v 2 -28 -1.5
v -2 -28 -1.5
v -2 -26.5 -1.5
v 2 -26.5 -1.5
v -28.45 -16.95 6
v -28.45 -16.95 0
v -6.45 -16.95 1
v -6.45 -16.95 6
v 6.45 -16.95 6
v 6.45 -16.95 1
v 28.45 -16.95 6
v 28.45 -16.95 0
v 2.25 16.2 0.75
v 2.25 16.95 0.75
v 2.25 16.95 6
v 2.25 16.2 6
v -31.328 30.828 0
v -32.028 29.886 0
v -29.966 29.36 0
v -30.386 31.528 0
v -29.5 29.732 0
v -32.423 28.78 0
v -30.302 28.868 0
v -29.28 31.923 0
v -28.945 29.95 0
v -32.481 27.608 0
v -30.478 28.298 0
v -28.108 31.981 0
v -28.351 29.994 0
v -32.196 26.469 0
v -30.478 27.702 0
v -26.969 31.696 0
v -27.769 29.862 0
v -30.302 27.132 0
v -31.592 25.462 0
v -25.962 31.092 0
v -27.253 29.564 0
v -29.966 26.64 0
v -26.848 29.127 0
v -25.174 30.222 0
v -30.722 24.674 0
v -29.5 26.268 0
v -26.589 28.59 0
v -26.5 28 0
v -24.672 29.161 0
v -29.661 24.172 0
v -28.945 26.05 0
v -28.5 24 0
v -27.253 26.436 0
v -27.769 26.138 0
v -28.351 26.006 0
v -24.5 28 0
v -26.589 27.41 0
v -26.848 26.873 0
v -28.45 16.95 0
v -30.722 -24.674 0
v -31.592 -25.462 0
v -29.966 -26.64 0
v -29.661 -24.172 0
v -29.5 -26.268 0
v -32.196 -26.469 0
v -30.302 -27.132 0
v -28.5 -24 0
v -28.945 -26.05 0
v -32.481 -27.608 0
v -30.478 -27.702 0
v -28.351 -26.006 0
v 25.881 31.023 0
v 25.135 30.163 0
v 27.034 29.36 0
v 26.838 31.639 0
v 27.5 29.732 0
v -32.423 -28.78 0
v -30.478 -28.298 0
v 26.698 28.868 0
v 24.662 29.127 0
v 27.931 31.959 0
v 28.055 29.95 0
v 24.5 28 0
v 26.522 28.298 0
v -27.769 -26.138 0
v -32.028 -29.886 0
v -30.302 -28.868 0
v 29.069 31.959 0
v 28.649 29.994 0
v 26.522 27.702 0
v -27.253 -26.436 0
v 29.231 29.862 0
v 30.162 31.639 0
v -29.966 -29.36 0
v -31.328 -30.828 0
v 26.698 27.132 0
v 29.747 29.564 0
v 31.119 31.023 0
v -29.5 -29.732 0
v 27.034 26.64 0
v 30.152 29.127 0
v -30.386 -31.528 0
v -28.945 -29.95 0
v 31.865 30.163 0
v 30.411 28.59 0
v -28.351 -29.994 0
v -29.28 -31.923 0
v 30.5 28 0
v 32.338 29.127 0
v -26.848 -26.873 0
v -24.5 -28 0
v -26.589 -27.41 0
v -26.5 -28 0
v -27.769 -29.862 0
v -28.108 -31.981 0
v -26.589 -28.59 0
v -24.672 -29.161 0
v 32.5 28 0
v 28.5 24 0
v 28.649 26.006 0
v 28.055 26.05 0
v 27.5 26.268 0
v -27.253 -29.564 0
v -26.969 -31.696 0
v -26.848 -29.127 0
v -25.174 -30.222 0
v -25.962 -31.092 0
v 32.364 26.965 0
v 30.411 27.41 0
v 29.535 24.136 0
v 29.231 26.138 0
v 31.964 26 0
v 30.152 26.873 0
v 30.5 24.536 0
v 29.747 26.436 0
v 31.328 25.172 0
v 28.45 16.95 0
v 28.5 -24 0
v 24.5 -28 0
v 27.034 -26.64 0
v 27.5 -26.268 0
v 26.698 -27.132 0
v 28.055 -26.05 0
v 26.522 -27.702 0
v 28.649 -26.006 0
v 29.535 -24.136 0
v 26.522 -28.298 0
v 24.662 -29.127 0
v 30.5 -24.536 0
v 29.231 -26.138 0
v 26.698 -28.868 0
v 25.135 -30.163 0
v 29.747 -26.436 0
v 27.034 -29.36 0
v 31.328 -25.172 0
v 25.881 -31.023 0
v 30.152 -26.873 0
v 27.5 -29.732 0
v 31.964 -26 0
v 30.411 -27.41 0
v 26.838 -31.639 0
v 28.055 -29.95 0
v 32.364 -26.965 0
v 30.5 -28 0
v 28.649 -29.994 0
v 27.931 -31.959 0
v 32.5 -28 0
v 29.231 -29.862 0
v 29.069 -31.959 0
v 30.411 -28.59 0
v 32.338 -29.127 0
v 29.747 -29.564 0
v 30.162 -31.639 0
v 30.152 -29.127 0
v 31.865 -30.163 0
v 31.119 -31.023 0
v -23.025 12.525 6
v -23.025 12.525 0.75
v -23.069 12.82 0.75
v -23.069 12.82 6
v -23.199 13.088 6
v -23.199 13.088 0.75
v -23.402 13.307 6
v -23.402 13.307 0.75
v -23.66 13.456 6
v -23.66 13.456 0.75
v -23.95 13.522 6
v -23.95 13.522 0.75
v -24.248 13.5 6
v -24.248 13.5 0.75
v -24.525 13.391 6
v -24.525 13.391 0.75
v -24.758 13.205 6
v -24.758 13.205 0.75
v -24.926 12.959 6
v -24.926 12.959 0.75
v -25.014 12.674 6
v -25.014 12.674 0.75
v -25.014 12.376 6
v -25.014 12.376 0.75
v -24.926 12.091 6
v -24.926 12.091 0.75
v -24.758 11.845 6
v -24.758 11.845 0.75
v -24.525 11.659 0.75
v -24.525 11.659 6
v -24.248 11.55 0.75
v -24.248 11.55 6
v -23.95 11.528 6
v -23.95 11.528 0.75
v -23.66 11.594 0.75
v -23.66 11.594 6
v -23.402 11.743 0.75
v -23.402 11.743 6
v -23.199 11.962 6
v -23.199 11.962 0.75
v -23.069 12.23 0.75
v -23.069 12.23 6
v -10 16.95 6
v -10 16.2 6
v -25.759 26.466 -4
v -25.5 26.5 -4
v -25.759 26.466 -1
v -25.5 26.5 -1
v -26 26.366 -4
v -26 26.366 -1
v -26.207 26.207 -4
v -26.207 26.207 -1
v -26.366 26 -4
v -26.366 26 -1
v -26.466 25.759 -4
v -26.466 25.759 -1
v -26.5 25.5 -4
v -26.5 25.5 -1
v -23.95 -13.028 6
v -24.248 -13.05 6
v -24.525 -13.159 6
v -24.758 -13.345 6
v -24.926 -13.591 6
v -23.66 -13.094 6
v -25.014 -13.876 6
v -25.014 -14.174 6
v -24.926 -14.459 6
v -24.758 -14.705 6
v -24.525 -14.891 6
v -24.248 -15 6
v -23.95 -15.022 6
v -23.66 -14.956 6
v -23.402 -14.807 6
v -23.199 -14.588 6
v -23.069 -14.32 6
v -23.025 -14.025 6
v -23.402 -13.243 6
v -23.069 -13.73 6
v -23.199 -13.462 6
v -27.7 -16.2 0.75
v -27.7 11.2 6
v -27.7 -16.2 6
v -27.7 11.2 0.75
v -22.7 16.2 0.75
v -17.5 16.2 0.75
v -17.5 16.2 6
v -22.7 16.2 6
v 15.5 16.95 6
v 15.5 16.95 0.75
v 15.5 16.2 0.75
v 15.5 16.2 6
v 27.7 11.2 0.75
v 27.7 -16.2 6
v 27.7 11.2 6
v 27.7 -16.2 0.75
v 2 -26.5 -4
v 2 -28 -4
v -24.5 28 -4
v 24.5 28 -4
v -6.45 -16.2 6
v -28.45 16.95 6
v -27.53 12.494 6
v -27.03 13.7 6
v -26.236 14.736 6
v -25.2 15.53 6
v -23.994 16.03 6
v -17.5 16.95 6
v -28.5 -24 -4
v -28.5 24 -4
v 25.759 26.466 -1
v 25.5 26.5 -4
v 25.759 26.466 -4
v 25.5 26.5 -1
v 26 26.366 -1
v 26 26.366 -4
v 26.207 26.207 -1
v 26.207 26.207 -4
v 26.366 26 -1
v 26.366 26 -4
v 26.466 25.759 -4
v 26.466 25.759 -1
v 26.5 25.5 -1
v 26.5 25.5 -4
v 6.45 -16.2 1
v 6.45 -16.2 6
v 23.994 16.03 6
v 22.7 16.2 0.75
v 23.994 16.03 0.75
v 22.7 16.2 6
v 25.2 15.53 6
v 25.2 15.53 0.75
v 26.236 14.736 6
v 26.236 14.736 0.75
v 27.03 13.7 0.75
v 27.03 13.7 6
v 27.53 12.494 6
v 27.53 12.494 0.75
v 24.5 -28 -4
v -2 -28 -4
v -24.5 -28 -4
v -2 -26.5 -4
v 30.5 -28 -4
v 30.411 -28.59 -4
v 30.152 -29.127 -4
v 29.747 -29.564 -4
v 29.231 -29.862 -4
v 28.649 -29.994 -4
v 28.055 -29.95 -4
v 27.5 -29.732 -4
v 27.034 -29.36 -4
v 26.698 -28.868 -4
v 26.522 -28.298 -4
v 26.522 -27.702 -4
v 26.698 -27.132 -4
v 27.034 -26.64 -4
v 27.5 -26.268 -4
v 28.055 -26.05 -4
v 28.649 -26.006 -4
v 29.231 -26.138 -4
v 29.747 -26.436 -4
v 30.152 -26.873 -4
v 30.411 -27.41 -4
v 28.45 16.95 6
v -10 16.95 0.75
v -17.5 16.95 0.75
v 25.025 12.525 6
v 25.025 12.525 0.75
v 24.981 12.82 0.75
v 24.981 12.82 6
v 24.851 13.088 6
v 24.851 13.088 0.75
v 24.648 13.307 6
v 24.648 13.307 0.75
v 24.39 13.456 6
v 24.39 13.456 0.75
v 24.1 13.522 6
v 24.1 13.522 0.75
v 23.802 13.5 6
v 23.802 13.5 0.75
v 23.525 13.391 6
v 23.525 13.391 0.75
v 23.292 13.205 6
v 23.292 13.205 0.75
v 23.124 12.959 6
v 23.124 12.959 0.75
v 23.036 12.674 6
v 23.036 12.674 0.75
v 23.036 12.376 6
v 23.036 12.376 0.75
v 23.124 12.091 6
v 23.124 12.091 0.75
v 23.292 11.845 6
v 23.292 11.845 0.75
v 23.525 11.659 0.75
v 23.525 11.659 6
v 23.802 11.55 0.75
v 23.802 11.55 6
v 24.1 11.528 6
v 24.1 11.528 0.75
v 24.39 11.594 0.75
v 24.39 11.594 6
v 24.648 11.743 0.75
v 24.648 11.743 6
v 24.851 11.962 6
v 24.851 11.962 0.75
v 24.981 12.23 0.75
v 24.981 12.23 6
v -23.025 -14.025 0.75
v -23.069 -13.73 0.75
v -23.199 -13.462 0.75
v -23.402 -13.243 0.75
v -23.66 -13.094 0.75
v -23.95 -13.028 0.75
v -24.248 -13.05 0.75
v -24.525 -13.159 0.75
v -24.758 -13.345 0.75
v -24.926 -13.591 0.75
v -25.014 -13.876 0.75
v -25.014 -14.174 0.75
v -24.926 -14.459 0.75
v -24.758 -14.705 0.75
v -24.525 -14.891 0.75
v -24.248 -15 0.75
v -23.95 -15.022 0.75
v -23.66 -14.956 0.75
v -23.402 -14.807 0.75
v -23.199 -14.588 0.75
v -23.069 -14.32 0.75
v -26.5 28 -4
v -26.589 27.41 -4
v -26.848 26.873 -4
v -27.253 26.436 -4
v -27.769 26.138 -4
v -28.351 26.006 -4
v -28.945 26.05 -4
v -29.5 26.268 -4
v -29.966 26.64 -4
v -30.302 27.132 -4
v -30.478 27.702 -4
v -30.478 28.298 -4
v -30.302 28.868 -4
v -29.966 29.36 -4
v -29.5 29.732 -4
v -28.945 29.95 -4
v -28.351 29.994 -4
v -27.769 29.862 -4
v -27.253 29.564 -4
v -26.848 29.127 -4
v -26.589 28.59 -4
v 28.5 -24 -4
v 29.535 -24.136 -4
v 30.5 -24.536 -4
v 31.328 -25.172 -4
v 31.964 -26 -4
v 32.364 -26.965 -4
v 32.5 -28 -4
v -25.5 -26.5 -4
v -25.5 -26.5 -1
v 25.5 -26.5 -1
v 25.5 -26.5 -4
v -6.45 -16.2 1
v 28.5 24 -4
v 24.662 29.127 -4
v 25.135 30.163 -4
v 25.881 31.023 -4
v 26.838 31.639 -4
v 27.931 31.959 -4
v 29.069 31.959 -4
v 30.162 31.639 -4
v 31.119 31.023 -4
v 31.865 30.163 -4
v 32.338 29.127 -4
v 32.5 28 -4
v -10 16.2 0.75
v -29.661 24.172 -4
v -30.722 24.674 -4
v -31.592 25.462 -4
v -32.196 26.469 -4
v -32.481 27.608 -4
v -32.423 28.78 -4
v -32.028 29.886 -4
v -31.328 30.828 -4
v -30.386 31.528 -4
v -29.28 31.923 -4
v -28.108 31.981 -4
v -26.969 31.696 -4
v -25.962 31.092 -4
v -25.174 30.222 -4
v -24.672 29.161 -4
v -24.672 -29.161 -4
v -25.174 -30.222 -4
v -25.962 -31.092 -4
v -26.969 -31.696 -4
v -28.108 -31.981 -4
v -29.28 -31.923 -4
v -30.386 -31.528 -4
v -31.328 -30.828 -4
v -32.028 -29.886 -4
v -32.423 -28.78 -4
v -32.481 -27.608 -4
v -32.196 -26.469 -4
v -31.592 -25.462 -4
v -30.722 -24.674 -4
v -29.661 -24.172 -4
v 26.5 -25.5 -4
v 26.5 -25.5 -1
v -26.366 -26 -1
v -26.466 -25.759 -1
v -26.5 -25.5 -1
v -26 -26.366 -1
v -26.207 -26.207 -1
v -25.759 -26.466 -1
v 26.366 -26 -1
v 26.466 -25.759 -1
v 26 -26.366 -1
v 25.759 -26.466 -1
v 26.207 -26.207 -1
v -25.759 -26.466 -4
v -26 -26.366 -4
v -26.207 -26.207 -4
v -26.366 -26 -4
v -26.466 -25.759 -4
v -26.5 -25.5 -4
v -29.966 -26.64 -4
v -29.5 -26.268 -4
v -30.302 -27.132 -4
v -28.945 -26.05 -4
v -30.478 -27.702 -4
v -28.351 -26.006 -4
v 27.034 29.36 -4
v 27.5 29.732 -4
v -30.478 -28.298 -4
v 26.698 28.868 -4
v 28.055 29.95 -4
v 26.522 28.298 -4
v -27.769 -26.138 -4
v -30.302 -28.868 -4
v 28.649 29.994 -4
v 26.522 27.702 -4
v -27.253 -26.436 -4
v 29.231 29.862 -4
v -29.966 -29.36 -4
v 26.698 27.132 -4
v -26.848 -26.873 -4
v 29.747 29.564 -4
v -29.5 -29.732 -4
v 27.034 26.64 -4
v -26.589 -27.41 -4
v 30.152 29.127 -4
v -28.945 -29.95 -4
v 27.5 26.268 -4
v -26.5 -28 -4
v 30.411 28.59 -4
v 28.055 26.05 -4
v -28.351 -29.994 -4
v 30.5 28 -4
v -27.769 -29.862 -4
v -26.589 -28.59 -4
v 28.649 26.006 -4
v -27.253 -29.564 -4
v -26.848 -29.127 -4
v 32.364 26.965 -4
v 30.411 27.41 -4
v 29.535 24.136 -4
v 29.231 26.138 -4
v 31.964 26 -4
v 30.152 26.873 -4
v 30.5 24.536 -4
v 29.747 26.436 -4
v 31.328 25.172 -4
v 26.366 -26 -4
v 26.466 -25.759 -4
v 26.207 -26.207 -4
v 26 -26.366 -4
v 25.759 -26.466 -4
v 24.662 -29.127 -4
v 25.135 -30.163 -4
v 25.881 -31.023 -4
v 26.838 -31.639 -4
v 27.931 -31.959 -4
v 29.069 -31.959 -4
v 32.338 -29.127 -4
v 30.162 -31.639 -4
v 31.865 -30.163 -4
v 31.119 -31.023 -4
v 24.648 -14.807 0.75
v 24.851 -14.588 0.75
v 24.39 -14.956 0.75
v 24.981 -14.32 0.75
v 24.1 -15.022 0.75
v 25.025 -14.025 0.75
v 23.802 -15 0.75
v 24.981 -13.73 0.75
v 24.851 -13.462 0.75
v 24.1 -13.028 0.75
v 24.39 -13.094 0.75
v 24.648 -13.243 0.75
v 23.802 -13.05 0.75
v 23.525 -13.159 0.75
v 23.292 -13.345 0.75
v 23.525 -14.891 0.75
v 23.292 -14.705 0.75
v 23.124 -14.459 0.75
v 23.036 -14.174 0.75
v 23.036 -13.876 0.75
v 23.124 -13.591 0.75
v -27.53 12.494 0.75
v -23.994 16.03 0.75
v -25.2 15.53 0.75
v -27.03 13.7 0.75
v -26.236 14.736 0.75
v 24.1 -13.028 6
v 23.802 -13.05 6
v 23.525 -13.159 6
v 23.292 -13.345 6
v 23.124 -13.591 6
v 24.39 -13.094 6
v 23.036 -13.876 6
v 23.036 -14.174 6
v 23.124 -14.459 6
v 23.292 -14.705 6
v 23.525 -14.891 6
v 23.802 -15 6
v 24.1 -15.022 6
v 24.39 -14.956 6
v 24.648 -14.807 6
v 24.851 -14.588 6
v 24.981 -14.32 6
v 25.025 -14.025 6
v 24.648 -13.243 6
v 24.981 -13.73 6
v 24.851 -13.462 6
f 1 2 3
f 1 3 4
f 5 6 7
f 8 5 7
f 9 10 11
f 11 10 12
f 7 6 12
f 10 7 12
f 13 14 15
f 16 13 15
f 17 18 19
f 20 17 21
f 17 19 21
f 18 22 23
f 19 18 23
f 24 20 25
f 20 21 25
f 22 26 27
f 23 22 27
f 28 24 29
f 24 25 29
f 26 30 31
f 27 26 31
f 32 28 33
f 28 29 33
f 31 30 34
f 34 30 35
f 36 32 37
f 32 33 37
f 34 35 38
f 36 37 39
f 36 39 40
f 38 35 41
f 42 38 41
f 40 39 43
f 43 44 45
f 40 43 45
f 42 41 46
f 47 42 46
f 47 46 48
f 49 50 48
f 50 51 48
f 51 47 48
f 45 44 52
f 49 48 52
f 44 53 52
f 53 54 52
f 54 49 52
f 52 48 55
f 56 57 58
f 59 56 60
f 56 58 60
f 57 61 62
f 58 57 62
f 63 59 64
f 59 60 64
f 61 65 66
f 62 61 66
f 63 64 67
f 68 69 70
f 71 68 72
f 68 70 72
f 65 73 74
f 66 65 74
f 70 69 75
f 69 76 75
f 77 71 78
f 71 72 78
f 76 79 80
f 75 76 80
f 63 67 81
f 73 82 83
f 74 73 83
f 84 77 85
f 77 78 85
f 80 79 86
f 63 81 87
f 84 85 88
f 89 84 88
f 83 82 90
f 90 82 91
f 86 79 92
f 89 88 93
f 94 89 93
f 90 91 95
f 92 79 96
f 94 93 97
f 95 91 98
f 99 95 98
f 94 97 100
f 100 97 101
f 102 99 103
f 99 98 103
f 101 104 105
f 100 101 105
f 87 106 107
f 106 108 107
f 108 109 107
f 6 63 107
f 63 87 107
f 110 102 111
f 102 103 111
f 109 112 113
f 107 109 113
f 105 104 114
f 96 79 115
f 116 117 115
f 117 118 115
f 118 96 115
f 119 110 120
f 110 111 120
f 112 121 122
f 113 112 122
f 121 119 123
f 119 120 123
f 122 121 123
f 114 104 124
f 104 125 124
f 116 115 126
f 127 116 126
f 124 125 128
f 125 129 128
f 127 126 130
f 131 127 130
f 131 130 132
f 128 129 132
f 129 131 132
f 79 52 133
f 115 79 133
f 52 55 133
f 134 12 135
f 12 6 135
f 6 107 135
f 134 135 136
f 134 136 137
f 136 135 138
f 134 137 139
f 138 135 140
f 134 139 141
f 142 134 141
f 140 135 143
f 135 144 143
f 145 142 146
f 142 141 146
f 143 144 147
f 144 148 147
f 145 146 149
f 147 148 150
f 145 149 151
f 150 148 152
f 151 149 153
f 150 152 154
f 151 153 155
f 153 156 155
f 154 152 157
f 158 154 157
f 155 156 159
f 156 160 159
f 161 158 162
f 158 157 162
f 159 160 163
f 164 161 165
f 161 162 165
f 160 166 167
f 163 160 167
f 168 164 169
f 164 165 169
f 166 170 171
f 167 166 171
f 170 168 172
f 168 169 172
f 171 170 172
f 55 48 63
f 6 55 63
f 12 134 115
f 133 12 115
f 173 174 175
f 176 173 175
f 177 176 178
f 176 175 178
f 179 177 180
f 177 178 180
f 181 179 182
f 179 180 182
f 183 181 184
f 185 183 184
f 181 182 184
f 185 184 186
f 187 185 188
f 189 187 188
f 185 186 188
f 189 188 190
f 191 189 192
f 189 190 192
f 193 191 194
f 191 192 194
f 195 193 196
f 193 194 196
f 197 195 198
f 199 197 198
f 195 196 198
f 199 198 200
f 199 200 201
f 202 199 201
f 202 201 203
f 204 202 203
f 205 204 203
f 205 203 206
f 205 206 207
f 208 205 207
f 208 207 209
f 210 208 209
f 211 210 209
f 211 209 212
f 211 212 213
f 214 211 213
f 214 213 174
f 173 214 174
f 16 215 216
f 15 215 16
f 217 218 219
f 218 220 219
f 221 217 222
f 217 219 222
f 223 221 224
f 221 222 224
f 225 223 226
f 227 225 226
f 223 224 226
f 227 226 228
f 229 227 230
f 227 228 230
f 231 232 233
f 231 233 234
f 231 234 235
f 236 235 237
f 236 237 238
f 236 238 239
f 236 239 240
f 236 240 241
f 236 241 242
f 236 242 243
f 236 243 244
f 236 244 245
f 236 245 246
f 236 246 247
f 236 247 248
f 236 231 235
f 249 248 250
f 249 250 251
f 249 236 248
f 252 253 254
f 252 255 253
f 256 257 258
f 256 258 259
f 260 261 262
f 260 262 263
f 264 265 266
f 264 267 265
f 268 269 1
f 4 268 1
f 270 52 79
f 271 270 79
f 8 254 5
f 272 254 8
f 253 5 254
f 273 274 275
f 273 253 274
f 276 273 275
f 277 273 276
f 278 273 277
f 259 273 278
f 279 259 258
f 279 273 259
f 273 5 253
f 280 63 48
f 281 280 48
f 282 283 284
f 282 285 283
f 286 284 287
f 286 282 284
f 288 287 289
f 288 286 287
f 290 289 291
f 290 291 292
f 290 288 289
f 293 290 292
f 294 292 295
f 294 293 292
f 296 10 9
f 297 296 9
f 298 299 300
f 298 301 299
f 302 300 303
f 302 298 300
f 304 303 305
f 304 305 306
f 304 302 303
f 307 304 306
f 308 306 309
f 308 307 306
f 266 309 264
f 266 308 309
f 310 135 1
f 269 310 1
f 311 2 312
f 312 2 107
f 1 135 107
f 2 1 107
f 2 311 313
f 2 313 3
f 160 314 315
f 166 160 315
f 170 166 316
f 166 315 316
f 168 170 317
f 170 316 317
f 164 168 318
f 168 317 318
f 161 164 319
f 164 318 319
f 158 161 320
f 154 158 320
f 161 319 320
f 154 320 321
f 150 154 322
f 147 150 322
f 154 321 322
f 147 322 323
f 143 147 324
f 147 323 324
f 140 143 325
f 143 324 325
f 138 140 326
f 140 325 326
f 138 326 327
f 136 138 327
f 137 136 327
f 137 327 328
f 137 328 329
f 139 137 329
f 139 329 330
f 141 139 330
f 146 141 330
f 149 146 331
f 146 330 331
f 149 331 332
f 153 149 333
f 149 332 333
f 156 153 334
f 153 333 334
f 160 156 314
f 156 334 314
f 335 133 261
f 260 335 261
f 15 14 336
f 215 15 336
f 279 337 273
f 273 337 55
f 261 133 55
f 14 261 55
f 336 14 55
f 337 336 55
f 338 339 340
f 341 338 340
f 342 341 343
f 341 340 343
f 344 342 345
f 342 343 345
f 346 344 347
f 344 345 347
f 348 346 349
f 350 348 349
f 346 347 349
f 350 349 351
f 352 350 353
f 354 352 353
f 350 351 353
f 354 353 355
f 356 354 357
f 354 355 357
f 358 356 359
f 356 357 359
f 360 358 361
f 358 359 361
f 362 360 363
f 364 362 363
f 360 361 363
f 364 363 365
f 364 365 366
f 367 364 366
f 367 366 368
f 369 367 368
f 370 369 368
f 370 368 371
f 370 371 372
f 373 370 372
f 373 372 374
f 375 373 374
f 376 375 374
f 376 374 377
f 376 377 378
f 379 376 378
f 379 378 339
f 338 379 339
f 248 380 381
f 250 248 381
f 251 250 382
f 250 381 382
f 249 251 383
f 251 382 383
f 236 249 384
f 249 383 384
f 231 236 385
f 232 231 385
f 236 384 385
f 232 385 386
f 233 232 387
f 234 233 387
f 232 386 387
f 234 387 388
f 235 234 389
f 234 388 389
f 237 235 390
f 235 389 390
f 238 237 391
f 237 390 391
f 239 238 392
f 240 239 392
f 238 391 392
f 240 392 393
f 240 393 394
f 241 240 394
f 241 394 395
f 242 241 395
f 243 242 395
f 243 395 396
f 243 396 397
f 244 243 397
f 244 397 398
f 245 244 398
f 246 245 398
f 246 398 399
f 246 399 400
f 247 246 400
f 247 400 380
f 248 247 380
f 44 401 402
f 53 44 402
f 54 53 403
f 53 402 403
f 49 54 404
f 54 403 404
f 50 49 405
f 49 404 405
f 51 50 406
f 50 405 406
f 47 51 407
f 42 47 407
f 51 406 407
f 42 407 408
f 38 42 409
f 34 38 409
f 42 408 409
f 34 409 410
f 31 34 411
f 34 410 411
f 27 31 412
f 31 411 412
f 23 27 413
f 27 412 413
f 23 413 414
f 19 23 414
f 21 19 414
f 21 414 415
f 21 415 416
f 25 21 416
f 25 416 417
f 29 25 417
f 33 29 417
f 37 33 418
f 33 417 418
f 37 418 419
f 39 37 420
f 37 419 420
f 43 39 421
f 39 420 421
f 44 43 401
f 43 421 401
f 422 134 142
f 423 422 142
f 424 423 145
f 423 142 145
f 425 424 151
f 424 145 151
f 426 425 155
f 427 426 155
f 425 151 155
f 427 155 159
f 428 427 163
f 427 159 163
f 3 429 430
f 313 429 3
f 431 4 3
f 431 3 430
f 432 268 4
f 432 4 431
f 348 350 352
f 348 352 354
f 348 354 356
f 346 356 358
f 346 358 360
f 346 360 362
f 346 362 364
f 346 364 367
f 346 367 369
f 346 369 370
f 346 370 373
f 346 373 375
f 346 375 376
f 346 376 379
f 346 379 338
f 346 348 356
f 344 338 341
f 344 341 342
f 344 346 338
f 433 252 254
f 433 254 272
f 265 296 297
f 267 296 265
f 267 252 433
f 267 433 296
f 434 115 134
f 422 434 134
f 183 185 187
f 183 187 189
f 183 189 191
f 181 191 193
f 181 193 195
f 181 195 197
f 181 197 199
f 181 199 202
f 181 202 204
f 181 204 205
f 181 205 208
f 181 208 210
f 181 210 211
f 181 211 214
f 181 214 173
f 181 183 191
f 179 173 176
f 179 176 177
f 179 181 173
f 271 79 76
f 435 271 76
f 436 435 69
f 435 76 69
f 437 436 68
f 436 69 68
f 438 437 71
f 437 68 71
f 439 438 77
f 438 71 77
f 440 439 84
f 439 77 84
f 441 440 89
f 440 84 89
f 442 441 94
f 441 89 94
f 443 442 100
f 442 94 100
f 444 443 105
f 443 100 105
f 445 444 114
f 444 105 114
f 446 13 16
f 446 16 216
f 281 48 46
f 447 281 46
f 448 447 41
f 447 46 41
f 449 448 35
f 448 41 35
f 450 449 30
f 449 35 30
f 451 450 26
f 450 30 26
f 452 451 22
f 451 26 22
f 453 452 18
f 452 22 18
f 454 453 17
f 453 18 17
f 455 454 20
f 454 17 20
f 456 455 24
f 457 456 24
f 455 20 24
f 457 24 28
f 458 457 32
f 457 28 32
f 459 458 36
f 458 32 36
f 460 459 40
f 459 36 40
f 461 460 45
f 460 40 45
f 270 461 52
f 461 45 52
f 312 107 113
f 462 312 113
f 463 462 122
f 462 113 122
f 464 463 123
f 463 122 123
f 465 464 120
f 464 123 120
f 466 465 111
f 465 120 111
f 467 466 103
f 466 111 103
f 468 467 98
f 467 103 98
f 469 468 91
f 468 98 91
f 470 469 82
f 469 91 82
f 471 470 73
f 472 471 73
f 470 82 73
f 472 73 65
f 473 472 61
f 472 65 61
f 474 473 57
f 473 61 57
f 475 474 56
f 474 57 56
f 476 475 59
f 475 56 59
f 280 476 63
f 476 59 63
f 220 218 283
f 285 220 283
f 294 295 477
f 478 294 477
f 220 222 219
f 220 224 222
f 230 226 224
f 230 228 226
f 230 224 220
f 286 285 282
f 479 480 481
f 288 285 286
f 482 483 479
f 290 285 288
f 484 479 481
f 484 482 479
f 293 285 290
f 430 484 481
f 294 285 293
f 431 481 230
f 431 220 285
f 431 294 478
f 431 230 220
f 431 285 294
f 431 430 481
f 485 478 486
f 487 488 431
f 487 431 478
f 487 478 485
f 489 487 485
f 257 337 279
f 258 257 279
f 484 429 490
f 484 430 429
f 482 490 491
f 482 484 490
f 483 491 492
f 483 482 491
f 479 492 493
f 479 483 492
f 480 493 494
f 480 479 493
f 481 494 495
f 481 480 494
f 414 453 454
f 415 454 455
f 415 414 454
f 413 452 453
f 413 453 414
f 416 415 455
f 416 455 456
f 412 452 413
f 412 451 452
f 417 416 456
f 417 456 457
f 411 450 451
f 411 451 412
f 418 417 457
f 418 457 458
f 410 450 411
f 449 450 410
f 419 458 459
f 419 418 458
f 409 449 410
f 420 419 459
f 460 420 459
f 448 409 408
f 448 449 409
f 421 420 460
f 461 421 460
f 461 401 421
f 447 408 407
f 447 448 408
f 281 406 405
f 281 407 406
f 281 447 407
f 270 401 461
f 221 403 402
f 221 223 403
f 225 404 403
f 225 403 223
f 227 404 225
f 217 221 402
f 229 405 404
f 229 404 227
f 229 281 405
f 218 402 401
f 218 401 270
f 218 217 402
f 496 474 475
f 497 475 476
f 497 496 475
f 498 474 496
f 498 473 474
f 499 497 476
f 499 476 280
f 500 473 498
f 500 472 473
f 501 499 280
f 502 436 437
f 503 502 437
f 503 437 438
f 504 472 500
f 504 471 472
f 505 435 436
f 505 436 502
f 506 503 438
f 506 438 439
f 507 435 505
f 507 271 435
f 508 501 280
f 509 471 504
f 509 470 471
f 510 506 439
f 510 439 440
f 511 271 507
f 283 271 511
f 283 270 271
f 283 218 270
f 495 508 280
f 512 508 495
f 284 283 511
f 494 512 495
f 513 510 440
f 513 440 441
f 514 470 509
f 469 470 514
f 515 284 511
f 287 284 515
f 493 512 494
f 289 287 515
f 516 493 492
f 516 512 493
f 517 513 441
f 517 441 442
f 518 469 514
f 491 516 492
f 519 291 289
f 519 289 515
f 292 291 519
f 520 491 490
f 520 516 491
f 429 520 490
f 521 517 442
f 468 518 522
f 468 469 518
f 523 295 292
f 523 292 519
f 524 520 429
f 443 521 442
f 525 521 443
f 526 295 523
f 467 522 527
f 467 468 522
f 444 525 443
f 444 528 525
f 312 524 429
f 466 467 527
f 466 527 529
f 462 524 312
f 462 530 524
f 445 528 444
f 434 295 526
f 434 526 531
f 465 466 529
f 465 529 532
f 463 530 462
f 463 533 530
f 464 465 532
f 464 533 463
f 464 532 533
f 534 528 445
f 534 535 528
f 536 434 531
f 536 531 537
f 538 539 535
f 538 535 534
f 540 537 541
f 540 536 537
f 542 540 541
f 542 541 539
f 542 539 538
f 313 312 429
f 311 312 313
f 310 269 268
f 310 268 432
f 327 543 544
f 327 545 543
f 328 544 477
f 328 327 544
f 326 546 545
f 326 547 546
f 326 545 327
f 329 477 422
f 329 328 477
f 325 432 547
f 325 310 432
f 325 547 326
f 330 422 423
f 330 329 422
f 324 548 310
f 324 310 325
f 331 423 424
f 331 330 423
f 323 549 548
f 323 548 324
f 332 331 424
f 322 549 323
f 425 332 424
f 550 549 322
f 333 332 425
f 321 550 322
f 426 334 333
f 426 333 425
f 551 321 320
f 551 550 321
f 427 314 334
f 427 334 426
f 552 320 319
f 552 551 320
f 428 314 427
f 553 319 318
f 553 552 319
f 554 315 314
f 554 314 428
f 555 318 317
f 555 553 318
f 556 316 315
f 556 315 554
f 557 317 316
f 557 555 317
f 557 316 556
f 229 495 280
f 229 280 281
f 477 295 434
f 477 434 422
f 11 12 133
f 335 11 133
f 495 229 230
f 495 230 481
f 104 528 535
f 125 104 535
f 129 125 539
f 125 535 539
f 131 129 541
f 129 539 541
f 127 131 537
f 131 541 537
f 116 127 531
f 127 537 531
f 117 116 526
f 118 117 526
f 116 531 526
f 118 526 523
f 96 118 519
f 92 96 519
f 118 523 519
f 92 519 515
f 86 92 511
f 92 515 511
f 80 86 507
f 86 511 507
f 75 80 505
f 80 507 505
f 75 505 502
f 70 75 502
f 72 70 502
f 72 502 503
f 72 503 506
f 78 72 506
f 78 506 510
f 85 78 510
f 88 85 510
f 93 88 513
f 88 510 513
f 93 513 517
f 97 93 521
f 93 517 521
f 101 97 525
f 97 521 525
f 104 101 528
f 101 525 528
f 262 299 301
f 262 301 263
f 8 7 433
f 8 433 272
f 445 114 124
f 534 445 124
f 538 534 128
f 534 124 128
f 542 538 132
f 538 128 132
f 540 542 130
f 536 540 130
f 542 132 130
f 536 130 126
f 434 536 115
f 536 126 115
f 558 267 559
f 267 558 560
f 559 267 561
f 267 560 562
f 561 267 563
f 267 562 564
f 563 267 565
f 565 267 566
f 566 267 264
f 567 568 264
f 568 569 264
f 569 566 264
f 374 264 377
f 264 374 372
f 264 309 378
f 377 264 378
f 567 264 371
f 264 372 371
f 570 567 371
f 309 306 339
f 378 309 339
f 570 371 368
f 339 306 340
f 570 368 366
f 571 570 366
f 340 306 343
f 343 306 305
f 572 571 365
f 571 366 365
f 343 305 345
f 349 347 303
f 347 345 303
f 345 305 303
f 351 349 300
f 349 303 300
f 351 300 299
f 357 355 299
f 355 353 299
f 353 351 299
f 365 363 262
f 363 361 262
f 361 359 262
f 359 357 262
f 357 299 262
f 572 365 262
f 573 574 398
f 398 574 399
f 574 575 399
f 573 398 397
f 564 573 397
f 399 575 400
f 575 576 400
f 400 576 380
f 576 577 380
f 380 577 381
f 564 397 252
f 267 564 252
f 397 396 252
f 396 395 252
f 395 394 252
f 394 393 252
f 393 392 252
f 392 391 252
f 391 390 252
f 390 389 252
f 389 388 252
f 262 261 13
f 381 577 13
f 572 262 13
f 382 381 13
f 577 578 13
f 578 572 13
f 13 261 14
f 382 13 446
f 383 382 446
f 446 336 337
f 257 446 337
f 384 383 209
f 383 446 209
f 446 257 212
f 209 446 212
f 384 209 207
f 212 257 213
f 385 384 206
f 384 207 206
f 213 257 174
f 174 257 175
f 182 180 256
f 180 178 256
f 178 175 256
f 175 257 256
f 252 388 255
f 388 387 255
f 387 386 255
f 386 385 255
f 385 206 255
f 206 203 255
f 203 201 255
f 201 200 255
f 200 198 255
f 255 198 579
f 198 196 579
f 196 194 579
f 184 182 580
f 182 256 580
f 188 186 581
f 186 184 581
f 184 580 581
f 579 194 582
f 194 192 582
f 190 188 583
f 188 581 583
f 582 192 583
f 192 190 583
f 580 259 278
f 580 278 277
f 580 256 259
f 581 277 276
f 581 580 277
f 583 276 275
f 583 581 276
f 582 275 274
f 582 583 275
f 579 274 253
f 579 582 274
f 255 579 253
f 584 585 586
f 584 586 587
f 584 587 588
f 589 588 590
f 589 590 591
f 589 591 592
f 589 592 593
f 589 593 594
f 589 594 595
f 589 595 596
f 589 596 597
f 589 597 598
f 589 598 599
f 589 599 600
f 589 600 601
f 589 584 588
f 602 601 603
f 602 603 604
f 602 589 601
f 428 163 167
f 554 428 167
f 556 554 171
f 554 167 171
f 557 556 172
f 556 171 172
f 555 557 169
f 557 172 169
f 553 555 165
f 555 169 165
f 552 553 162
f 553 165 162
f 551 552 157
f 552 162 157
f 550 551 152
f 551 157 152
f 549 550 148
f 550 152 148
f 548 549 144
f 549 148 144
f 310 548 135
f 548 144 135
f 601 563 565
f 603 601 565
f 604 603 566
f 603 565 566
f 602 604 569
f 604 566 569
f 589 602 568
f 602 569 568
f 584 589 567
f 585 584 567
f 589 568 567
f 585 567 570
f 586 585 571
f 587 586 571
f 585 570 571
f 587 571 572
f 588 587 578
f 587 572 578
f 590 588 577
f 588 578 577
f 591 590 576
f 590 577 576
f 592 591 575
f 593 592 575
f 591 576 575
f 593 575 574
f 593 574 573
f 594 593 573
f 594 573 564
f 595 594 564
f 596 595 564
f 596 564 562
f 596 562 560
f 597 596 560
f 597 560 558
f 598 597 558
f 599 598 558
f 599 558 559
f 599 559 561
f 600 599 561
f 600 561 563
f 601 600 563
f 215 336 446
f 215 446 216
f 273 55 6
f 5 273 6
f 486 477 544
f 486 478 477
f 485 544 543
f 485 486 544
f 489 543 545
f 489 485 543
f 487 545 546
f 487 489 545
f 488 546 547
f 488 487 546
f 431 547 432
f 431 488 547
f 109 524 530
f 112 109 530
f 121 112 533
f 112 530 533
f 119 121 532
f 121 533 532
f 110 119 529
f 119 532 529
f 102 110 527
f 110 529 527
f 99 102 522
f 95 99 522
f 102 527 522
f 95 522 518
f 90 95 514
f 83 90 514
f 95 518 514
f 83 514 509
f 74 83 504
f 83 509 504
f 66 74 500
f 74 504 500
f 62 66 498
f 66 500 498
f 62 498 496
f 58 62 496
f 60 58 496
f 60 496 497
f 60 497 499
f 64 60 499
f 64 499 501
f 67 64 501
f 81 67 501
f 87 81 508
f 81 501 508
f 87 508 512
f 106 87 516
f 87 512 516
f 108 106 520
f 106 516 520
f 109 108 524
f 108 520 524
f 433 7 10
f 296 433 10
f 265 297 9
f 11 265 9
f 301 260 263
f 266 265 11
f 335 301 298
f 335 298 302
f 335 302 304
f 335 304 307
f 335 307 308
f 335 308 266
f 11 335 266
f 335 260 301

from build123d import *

# Parameters (mm, degrees)
F2_DEPTH  = 6
F3_T      = -0.75
F4_R      = 1
F5_DEPTH  = 6
F6_W      = 13.25
F6_H      = 5.25
F6_W_2    = 7.5
F7_DEPTH  = 0.75
F9_DEPTH  = 4
F10_W     = 12.9
F10_H     = 5
F11_DEPTH = 1
F12_R     = 2
F13_DEPTH = 4
F14_W     = 53
F14_H     = 53
F15_DEPTH = 3
F16_R     = 1
F17_R     = 5
F18_W     = 4
F18_H     = 2.5
F19_DEPTH = 1.5


with BuildPart() as f2:
    # F1 (on Top) → F2 (new body)
    with BuildSketch(Plane.XY):
        Polygon((-28.45, 16.95), (-28.45, -16.95), (28.45, -16.95), (28.45, 16.95), (16.2, 16.95), (1.45, 16.95), (-9.05, 16.95), (-18.3, 16.95), align=None)
    extrude(amount=F2_DEPTH)

    # F3
    f3_openings = [f2.faces().sort_by_distance(p)[0] for p in [
        (0, 0, 6),
    ]]
    offset(amount=F3_T, openings=f3_openings)

    # F4 (on Top) → F5 (join)
    with BuildSketch(Plane.XY):
        with Locations((-24.025, 12.525)):
            Circle(F4_R)
        with Locations((24.025, 12.525)):
            Circle(F4_R)
        with Locations((-24.025, -14.025)):
            Circle(F4_R)
        with Locations((24.025, -14.025)):
            Circle(F4_R)
    extrude(amount=F5_DEPTH)

    # F6 (on face) → F7 (cut)
    with BuildSketch(Plane(origin=(0, 16.95, 0), x_dir=(-1, 0, 0), z_dir=(0, 1, 0))):
        with Locations((-8.875, 3.375)):
            Rectangle(F6_W, F6_H)
        with Locations((13.75, 3.375)):
            Rectangle(F6_W_2, F6_H)
    extrude(amount=-F7_DEPTH, mode=Mode.SUBTRACT)

    # F8 (on face) → F9 (join)
    with BuildSketch(Plane(origin=(0, 0, 0), x_dir=(1, 0, 0), z_dir=(0, 0, -1))):
        with BuildLine():
            ThreePointArc((-28.5, 24), (-25.6715728753, 25.1715728753), (-24.5, 28))
            Line((-24.5, 28), (-28.5, 28))
            Line((-28.5, 28), (-28.5, 24))
        make_face()
        with BuildLine():
            Line((-28.5, 28), (-24.5, 28))
            ThreePointArc((-24.5, 28), (-31.3284271247, 30.8284271247), (-28.5, 24))
            Line((-28.5, 24), (-28.5, 28))
        make_face()
        with BuildLine():
            Line((24.5, 28), (-24.5, 28))
            ThreePointArc((-24.5, 28), (-25.6715728753, 25.1715728753), (-28.5, 24))
            Line((-28.5, 24), (-28.5, -24))
            ThreePointArc((-28.5, -24), (-25.6715728753, -25.1715728753), (-24.5, -28))
            Line((-24.5, -28), (24.5, -28))
            ThreePointArc((24.5, -28), (25.6715728753, -25.1715728753), (28.5, -24))
            Line((28.5, -24), (28.5, 24))
            ThreePointArc((28.5, 24), (25.6715728753, 25.1715728753), (24.5, 28))
        make_face()
        with BuildLine():
            ThreePointArc((32.5, 28), (28.5, 32), (24.5, 28))
            Line((24.5, 28), (28.5, 28))
            Line((28.5, 28), (28.5, 24))
            ThreePointArc((28.5, 24), (31.3284271247, 25.1715728753), (32.5, 28))
        make_face()
        with BuildLine():
            Line((28.5, 28), (24.5, 28))
            ThreePointArc((24.5, 28), (25.6715728753, 25.1715728753), (28.5, 24))
            Line((28.5, 24), (28.5, 28))
        make_face()
        with BuildLine():
            ThreePointArc((-24.5, -28), (-25.6715728753, -25.1715728753), (-28.5, -24))
            Line((-28.5, -24), (-28.5, -28))
            Line((-28.5, -28), (-24.5, -28))
        make_face()
        with BuildLine():
            Line((-28.5, -28), (-28.5, -24))
            ThreePointArc((-28.5, -24), (-31.3284271247, -30.8284271247), (-24.5, -28))
            Line((-24.5, -28), (-28.5, -28))
        make_face()
        with BuildLine():
            ThreePointArc((32.5, -28), (31.3284271247, -25.1715728753), (28.5, -24))
            Line((28.5, -24), (28.5, -28))
            Line((28.5, -28), (24.5, -28))
            ThreePointArc((24.5, -28), (28.5, -32), (32.5, -28))
        make_face()
        with BuildLine():
            Line((28.5, -28), (28.5, -24))
            ThreePointArc((28.5, -24), (25.6715728753, -25.1715728753), (24.5, -28))
            Line((24.5, -28), (28.5, -28))
        make_face()
    extrude(amount=F9_DEPTH)

    # F10 (on face) → F11 (cut)
    with BuildSketch(Plane.XZ.offset(16.95)):
        with Locations((0, 3.5)):
            Rectangle(F10_W, F10_H)
    extrude(amount=-F11_DEPTH, mode=Mode.SUBTRACT)

    # F12 (on face) → F13 (cut, through all)
    with BuildSketch(Plane(origin=(0, 0, -4), x_dir=(1, 0, 0), z_dir=(0, 0, -1))):
        with Locations((-28.5, 28)):
            Circle(F12_R)
        with Locations((28.5, 28)):
            Circle(F12_R)
        with Locations((28.5, -28)):
            Circle(F12_R)
        with Locations((-28.5, -28)):
            Circle(F12_R)
    extrude(amount=-F13_DEPTH, mode=Mode.SUBTRACT)

    # F14 (on face) → F15 (cut)
    with BuildSketch(Plane(origin=(0, 0, -4), x_dir=(1, 0, 0), z_dir=(0, 0, -1))):
        Rectangle(F14_W, F14_H)
    extrude(amount=-F15_DEPTH, mode=Mode.SUBTRACT)

    # F16
    f16_edges = [f2.edges().sort_by_distance(p)[0] for p in [
        (-26.5, -26.5, -2.5),
        (26.5, -26.5, -2.5),
        (26.5, 26.5, -2.5),
        (-26.5, 26.5, -2.5),
    ]]
    fillet(f16_edges, radius=F16_R)

    # F17
    f17_edges = [f2.edges().sort_by_distance(p)[0] for p in [
        (-27.7, 16.2, 3.375),
        (27.7, 16.2, 3.375),
    ]]
    fillet(f17_edges, radius=F17_R)

    # F18 (on face) → F19 (cut, through all)
    with BuildSketch(Plane.XZ.offset(28)):
        with Locations((0, -2.75)):
            Rectangle(F18_W, F18_H)
    extrude(amount=-F19_DEPTH, mode=Mode.SUBTRACT)


solid = f2.part
